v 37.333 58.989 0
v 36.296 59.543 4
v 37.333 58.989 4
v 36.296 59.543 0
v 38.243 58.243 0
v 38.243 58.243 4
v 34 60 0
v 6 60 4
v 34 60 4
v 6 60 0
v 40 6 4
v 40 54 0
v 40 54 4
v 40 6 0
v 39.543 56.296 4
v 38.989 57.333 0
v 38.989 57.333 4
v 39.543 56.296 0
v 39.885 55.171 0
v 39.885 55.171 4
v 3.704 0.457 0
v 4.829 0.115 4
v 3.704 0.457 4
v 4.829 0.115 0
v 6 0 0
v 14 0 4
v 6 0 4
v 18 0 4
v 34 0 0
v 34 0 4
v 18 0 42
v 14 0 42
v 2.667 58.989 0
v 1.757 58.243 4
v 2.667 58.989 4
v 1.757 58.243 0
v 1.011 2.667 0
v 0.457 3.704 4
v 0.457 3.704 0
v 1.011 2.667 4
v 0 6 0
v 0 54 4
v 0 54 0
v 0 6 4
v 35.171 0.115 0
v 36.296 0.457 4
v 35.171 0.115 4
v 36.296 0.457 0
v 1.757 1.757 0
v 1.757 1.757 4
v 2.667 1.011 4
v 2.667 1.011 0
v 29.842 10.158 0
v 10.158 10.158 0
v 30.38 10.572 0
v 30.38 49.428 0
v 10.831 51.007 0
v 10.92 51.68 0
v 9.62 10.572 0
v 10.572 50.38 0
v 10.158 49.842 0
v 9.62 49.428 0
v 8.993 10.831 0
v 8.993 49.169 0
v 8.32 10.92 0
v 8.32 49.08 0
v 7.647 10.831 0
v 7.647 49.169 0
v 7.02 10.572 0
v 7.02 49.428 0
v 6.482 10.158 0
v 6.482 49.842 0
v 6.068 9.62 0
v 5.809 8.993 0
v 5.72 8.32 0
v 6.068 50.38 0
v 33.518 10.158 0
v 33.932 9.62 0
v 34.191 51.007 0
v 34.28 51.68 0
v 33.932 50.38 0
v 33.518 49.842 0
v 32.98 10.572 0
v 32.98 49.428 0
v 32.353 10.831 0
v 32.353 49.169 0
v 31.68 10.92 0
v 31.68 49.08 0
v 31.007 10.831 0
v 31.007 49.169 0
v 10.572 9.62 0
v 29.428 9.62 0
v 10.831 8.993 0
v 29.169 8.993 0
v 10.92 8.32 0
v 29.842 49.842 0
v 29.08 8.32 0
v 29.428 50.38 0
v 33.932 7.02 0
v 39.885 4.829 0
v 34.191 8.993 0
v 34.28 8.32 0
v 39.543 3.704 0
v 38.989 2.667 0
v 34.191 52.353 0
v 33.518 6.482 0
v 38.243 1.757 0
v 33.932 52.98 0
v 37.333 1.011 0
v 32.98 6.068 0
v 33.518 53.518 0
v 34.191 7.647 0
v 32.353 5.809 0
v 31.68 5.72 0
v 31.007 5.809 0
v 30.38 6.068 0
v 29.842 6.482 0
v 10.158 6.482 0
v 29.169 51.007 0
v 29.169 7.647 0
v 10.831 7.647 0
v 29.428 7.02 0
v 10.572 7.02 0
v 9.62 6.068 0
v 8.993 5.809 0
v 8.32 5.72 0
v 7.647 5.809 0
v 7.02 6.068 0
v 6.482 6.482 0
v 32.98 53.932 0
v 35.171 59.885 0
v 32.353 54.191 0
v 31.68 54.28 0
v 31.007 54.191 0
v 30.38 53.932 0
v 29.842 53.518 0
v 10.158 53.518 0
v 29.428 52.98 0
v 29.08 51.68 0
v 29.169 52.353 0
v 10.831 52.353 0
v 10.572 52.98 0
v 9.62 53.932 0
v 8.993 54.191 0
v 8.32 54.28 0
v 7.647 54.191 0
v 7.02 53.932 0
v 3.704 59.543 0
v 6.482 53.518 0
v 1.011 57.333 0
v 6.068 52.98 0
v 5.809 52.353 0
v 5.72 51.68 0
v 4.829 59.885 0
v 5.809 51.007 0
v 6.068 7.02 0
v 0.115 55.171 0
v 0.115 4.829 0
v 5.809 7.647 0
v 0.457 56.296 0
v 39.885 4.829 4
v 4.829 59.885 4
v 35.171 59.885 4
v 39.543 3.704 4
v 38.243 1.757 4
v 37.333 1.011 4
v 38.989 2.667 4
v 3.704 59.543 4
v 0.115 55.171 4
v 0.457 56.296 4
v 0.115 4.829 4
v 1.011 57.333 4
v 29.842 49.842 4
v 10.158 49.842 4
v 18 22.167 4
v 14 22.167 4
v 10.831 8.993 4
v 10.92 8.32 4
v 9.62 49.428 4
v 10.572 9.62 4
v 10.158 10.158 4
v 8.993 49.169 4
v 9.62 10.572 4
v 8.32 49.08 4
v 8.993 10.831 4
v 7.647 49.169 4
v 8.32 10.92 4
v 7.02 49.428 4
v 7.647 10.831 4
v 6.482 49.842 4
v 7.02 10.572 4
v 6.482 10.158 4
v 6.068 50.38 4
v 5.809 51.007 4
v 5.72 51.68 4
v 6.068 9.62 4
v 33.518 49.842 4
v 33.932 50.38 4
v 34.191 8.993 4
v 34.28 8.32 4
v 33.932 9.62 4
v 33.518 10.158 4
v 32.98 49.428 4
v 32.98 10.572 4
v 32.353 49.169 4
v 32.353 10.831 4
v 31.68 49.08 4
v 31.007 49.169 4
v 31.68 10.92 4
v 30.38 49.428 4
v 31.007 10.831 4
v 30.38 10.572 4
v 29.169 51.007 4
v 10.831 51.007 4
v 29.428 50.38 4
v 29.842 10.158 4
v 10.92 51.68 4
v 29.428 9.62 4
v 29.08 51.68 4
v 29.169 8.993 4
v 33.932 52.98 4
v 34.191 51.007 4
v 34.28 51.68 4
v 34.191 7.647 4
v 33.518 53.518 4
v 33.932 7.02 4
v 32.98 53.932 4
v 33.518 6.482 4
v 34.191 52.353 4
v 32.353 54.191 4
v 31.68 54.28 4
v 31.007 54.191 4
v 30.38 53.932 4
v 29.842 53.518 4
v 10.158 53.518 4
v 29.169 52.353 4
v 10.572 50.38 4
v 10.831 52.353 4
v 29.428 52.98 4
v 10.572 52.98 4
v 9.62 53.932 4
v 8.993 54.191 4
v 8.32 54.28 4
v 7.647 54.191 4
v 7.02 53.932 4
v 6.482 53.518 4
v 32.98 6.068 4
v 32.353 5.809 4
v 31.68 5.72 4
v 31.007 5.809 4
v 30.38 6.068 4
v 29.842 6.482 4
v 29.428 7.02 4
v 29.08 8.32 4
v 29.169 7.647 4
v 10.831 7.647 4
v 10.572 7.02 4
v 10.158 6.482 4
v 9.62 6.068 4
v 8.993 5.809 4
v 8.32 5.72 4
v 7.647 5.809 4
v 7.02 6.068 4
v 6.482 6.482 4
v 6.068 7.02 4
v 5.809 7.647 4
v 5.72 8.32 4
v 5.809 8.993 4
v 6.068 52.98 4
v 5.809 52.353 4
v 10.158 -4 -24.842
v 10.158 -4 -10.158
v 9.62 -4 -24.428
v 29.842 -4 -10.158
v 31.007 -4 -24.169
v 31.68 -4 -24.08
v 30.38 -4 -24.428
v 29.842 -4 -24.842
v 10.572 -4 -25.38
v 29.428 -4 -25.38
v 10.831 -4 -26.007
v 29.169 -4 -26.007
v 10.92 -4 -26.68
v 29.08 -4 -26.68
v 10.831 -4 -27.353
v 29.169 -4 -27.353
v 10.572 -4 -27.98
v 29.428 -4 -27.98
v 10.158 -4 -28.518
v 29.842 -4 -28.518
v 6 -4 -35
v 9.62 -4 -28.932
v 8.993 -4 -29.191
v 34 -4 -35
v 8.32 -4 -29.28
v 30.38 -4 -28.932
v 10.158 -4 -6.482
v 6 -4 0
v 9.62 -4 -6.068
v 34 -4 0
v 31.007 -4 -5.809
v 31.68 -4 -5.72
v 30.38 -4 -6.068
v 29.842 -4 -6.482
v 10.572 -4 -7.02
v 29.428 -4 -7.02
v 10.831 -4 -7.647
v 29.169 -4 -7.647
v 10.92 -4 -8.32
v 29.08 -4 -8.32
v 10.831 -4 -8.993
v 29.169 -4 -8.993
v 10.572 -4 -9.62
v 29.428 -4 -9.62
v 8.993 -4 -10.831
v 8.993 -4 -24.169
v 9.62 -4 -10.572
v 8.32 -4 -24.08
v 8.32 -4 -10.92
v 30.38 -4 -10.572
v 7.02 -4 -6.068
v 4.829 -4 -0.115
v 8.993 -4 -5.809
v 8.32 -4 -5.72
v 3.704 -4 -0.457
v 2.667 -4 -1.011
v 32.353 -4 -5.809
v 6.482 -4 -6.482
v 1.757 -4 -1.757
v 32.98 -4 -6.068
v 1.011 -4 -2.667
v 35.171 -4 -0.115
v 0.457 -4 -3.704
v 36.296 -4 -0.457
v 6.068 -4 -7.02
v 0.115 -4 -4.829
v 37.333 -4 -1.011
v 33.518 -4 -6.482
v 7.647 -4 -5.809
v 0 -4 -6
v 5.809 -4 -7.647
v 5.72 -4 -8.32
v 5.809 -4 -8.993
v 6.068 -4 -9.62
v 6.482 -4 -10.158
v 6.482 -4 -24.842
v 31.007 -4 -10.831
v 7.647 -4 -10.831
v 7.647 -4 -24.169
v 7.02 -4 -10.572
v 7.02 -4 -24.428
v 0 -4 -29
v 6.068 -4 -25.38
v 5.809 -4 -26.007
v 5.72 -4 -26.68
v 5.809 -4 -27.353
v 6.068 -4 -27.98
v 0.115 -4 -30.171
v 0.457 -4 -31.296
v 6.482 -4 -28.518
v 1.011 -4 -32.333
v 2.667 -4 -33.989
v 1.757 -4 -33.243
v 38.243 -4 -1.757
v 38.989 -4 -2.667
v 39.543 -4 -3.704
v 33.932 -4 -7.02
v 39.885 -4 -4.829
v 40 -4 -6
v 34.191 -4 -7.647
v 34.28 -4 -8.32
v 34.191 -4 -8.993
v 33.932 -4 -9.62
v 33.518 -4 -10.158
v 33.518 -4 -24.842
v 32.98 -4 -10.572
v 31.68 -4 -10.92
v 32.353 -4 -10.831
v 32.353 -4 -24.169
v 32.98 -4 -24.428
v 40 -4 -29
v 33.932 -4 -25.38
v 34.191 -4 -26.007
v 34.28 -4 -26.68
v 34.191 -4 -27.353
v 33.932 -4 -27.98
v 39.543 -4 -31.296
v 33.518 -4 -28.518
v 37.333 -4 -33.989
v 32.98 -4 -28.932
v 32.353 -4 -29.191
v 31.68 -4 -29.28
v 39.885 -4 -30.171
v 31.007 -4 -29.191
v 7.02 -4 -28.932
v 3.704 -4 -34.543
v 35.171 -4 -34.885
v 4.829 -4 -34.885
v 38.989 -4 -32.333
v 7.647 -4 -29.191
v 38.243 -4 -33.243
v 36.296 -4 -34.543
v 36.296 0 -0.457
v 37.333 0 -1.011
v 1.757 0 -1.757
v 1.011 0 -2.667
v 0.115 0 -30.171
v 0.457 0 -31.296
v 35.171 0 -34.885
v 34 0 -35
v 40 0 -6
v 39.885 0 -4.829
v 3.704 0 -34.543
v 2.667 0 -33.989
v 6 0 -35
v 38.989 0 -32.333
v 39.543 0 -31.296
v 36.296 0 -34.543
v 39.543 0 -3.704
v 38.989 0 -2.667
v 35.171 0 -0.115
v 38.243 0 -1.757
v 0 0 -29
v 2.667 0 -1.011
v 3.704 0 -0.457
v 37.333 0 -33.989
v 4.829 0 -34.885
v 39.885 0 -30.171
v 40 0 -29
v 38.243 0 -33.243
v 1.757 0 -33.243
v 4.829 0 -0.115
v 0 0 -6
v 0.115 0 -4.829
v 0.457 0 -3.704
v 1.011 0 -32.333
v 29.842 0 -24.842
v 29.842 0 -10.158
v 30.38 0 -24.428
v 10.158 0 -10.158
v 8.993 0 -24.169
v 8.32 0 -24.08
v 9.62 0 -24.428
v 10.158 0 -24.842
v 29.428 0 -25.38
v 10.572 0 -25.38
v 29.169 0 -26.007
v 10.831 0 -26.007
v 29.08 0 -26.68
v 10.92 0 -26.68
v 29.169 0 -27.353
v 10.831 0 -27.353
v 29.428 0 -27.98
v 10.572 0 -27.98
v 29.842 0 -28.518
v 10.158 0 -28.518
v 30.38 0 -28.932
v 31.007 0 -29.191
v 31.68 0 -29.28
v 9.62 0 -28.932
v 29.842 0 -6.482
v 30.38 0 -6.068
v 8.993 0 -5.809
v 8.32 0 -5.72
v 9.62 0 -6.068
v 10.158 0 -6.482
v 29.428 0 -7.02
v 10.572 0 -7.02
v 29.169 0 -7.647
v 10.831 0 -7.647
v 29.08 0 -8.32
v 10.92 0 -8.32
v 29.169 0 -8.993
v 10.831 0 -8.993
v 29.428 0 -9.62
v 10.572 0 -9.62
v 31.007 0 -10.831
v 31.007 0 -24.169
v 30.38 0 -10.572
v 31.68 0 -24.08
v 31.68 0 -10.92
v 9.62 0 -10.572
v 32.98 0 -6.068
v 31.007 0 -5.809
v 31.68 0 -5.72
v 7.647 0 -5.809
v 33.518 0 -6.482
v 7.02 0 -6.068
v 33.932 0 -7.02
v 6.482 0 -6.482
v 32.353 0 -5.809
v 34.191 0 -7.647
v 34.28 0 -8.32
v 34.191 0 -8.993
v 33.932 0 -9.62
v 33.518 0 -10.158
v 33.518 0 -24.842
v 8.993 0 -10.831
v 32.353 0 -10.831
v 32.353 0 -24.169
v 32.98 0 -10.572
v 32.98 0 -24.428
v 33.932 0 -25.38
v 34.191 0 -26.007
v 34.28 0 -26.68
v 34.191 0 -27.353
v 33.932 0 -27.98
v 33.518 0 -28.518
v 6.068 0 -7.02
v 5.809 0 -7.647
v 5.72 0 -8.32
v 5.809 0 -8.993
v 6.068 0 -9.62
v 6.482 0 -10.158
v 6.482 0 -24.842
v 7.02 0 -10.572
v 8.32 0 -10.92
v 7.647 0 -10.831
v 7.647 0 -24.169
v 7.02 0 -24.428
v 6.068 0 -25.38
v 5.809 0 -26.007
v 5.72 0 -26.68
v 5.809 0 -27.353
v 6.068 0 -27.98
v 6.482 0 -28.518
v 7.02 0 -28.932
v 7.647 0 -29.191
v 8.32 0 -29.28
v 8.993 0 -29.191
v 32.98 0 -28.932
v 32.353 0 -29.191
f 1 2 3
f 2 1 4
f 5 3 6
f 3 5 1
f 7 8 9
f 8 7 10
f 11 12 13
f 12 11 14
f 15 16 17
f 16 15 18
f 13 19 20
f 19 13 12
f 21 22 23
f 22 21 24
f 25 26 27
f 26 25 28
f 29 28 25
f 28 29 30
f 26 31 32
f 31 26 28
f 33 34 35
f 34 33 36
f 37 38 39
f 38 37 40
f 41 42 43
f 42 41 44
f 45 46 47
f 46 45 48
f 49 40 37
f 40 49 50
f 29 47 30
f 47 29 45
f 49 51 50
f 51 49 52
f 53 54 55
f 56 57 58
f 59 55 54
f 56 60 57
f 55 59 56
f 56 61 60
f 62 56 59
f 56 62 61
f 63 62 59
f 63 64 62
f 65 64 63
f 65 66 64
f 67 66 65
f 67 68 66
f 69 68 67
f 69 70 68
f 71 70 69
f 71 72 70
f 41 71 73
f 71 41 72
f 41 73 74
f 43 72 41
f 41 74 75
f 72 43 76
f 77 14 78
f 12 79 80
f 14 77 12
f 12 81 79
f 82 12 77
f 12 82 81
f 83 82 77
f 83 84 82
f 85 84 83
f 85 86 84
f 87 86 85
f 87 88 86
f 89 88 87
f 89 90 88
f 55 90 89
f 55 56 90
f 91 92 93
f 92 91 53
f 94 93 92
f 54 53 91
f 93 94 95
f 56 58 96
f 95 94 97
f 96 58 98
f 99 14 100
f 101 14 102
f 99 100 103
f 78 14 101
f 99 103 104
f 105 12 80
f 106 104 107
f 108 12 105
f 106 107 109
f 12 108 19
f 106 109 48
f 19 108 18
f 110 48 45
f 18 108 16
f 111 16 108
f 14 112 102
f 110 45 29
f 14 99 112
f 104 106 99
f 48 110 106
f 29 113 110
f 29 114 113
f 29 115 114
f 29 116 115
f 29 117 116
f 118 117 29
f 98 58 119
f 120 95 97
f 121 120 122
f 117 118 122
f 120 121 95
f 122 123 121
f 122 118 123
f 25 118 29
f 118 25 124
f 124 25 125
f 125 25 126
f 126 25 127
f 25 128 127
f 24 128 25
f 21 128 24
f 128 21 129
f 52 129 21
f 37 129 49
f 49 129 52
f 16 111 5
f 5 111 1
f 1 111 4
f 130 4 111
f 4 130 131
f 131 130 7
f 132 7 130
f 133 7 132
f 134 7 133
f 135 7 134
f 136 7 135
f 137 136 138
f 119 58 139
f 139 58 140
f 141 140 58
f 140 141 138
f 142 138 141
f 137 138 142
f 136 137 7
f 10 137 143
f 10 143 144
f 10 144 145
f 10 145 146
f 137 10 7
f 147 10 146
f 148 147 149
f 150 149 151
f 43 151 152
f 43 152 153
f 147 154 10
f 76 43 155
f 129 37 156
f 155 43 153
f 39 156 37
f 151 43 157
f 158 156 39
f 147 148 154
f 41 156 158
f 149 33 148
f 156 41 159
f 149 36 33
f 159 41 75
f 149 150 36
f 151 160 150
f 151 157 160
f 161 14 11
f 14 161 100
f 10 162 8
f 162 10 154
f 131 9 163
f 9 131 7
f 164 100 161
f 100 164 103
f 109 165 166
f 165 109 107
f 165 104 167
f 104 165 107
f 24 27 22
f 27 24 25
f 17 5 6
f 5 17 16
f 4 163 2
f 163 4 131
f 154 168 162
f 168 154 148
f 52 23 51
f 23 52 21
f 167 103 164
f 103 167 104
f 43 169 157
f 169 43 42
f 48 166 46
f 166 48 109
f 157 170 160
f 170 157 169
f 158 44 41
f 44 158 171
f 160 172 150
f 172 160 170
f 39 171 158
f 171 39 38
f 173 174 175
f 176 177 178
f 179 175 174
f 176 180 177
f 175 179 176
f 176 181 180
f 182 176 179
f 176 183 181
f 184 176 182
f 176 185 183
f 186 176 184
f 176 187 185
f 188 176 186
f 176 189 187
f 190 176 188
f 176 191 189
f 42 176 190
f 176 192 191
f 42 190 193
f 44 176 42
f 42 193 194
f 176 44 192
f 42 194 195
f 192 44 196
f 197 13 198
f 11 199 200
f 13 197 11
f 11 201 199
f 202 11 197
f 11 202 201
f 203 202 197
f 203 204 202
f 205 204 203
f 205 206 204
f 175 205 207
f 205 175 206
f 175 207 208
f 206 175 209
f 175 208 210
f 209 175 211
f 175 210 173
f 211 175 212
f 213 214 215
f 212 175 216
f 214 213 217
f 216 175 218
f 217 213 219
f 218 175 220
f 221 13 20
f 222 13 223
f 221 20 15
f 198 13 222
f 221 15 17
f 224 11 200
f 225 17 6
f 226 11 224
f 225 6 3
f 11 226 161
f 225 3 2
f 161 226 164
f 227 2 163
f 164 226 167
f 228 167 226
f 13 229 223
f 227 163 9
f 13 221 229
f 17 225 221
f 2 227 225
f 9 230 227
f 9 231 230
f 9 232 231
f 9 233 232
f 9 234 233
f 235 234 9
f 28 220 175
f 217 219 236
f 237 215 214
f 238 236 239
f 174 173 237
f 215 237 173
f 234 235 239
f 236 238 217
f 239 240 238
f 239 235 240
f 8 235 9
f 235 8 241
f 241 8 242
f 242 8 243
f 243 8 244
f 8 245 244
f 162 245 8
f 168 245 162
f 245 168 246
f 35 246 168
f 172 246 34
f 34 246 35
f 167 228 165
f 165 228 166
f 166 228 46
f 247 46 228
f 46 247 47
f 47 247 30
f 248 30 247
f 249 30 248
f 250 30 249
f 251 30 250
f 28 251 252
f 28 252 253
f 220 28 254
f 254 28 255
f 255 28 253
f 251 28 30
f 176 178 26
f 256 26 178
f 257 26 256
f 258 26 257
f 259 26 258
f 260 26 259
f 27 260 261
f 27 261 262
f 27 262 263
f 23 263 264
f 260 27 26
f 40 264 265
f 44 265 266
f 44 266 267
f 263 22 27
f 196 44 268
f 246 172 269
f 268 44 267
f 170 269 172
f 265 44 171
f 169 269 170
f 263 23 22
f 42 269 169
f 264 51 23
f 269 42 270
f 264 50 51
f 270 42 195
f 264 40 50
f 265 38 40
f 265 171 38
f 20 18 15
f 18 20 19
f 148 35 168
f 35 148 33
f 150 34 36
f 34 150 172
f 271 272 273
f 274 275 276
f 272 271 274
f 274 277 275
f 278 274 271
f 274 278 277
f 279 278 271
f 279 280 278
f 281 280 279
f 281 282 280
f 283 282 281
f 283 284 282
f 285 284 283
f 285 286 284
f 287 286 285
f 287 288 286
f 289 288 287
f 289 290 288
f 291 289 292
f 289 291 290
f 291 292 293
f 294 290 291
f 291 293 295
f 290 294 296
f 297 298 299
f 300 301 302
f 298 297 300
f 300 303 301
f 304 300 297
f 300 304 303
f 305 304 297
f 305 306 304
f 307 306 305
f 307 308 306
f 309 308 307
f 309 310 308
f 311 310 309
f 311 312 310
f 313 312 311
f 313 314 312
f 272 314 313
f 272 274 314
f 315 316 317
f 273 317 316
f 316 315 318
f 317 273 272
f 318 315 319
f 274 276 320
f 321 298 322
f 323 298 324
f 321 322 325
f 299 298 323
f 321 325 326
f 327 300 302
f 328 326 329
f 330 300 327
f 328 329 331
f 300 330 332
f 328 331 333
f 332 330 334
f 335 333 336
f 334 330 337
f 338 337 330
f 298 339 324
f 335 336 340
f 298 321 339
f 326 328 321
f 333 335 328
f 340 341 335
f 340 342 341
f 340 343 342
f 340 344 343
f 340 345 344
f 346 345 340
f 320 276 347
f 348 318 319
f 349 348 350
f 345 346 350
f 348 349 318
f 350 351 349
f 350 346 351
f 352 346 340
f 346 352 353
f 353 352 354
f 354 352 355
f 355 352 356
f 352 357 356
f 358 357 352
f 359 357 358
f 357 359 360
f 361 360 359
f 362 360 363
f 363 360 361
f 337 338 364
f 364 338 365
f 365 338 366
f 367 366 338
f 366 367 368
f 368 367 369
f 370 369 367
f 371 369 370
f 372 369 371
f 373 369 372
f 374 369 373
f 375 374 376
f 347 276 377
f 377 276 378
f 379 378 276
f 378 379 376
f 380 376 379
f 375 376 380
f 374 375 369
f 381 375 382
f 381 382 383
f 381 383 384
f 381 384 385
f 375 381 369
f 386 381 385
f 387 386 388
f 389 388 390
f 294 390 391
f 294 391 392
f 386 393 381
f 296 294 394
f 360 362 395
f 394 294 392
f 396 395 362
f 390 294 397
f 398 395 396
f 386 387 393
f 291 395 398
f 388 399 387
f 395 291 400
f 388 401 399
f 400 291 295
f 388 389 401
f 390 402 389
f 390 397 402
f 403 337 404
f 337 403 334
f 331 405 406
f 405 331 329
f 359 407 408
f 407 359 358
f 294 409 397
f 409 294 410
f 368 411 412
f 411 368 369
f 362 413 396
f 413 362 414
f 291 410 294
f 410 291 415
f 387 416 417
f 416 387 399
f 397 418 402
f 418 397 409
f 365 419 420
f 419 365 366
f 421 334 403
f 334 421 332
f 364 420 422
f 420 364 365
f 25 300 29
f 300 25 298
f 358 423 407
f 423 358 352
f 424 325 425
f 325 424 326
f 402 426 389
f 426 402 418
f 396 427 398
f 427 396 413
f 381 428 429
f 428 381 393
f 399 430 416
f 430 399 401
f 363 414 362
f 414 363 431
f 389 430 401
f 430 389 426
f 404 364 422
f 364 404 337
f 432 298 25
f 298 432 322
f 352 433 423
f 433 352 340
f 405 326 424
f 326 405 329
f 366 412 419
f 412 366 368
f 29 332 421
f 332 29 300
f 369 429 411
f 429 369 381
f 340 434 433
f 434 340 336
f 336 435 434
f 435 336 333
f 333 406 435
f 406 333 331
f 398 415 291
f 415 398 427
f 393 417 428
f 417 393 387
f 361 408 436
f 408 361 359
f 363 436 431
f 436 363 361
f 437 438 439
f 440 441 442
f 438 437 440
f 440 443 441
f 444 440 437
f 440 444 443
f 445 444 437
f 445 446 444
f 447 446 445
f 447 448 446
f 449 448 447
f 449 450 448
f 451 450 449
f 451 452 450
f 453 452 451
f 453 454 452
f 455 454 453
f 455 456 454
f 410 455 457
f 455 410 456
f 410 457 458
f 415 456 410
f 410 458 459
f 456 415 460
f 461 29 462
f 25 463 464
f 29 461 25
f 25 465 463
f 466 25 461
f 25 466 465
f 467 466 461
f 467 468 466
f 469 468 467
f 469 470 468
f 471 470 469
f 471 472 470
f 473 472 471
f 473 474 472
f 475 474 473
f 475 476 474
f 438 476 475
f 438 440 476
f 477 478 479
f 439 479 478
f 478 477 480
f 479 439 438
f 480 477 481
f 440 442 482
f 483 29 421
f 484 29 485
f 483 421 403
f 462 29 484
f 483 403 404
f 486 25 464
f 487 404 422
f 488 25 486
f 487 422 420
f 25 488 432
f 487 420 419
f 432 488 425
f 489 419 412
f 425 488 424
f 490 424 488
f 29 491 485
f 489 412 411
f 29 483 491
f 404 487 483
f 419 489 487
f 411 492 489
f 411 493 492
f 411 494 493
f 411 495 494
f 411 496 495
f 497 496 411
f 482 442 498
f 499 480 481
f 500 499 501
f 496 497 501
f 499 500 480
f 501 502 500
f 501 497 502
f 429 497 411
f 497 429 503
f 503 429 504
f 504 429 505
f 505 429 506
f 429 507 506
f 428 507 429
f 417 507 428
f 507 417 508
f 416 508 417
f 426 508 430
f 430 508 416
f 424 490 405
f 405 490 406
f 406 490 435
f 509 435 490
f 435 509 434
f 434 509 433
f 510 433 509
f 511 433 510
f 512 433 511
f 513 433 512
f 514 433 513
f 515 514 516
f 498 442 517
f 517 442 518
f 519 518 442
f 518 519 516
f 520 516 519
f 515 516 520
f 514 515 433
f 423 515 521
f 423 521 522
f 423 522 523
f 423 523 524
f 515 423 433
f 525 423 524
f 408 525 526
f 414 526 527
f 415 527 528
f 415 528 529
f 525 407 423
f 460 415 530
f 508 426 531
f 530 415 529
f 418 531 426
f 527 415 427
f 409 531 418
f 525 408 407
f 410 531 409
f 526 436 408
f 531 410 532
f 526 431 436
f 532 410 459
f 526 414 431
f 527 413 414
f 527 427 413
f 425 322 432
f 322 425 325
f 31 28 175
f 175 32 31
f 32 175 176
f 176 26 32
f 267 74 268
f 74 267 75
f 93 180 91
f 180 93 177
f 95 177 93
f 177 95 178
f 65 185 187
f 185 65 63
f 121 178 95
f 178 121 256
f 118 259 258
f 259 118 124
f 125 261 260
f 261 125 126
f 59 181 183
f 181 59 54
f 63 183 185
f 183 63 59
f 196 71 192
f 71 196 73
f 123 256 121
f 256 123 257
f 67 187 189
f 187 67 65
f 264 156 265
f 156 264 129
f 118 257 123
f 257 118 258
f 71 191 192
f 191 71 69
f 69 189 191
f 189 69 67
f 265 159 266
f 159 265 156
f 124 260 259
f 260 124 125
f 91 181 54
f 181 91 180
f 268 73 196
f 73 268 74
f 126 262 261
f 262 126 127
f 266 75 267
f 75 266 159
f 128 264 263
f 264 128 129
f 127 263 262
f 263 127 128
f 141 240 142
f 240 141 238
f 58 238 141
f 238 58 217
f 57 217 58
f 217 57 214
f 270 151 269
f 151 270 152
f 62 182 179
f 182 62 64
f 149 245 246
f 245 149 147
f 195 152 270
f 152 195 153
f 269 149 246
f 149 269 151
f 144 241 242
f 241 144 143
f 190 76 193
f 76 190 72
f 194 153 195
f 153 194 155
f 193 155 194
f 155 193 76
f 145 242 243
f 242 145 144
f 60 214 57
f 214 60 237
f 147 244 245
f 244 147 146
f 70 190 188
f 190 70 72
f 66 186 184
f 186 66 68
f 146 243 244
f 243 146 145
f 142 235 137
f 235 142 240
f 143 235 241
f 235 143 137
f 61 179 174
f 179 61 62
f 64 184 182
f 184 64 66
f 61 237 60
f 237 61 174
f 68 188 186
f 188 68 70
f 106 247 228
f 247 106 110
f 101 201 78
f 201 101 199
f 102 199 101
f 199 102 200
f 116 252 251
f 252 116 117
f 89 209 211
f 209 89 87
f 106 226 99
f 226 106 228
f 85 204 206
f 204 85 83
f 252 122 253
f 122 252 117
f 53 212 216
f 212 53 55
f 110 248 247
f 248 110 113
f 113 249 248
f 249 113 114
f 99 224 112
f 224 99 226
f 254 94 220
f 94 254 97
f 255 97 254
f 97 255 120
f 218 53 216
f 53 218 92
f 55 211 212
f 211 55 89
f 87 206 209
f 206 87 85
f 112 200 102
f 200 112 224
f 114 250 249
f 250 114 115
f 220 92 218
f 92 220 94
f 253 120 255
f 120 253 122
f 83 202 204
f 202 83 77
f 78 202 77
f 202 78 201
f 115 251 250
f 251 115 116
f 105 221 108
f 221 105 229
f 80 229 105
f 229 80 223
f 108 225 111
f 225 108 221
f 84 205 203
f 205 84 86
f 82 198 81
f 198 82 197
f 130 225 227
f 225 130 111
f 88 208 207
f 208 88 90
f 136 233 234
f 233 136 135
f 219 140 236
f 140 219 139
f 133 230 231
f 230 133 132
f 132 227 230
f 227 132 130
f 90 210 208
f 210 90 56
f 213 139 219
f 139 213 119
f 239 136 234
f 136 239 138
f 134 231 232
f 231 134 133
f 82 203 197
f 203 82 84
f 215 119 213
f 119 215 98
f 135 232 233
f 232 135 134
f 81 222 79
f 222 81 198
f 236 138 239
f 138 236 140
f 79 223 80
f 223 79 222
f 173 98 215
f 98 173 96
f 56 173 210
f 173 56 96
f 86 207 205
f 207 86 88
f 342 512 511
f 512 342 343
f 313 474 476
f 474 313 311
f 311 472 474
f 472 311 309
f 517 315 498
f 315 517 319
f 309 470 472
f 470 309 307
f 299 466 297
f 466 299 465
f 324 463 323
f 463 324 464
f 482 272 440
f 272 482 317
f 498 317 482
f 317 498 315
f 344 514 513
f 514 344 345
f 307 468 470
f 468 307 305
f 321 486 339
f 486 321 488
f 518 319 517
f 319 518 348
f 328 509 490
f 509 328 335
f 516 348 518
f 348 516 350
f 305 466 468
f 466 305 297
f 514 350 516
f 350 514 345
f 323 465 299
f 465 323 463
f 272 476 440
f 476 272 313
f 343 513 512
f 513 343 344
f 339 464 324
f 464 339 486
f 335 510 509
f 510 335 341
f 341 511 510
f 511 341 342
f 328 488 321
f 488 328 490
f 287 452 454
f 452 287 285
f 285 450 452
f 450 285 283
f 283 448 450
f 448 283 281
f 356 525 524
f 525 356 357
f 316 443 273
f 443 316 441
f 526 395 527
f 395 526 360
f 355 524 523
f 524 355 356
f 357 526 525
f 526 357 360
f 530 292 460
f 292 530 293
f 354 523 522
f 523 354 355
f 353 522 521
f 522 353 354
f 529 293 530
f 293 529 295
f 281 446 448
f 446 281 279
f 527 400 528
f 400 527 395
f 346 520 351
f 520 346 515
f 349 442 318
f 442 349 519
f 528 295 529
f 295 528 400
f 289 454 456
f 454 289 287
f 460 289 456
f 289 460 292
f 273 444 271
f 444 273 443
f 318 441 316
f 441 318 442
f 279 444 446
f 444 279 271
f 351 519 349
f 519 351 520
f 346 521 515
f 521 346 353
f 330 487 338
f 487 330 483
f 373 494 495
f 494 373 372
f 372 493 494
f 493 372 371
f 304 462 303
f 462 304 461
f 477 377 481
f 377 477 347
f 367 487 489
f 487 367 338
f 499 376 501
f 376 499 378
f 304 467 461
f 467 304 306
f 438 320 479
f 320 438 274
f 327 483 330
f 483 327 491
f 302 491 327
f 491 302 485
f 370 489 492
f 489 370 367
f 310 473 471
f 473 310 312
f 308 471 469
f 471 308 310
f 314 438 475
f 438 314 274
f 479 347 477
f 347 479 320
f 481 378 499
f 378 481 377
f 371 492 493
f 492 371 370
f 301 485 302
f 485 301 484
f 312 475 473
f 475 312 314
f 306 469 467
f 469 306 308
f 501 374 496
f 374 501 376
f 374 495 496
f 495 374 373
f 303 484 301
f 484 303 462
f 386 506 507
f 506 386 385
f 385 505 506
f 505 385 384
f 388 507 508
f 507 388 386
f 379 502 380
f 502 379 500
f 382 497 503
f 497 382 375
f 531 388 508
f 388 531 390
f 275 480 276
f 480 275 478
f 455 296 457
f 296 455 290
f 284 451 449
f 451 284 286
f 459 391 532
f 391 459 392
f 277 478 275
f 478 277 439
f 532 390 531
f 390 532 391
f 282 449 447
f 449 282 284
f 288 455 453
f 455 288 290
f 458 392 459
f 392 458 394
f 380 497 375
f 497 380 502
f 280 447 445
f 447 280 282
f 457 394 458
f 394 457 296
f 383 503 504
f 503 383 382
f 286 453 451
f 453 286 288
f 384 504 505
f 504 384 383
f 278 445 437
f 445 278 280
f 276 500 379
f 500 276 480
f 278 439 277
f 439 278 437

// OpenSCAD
// A bracket, parametric enough to be worth editing.
//
// The point of this example is the loop: change a number, save, and watch the
// preview follow. Everything here is one file so there is nothing to set up.

thickness   = 4;      // wall thickness
width       = 40;     // across the face
height      = 60;     // up the wall
depth       = 35;     // out from the wall
hole        = 5.2;    // for an M5 screw
fillet      = 6;      // corner radius

module plate(w, h, t, r) {
    hull() {
        for (x = [r, w - r], y = [r, h - r])
            translate([x, y, 0]) cylinder(h = t, r = r, $fn = 32);
    }
}

module holes(w, h) {
    inset = hole * 1.6;
    for (x = [inset, w - inset], y = [inset, h - inset])
        translate([x, y, -1]) cylinder(h = 20, d = hole, $fn = 24);
}

module bracket() {
    difference() {
        union() {
            plate(width, height, thickness, fillet);
            rotate([-90, 0, 0])
                translate([0, 0, -thickness])
                    plate(width, depth, thickness, fillet);
            // The gusset that stops it folding.
            translate([width / 2 - thickness / 2, 0, 0])
                rotate([0, -90, 0])
                    linear_extrude(thickness)
                        polygon([[0, 0], [height * 0.7, 0], [0, depth * 0.7]]);
        }
        holes(width, height);
        rotate([-90, 0, 0]) translate([0, 0, -thickness - 1]) holes(width, depth);
    }
}

bracket();
